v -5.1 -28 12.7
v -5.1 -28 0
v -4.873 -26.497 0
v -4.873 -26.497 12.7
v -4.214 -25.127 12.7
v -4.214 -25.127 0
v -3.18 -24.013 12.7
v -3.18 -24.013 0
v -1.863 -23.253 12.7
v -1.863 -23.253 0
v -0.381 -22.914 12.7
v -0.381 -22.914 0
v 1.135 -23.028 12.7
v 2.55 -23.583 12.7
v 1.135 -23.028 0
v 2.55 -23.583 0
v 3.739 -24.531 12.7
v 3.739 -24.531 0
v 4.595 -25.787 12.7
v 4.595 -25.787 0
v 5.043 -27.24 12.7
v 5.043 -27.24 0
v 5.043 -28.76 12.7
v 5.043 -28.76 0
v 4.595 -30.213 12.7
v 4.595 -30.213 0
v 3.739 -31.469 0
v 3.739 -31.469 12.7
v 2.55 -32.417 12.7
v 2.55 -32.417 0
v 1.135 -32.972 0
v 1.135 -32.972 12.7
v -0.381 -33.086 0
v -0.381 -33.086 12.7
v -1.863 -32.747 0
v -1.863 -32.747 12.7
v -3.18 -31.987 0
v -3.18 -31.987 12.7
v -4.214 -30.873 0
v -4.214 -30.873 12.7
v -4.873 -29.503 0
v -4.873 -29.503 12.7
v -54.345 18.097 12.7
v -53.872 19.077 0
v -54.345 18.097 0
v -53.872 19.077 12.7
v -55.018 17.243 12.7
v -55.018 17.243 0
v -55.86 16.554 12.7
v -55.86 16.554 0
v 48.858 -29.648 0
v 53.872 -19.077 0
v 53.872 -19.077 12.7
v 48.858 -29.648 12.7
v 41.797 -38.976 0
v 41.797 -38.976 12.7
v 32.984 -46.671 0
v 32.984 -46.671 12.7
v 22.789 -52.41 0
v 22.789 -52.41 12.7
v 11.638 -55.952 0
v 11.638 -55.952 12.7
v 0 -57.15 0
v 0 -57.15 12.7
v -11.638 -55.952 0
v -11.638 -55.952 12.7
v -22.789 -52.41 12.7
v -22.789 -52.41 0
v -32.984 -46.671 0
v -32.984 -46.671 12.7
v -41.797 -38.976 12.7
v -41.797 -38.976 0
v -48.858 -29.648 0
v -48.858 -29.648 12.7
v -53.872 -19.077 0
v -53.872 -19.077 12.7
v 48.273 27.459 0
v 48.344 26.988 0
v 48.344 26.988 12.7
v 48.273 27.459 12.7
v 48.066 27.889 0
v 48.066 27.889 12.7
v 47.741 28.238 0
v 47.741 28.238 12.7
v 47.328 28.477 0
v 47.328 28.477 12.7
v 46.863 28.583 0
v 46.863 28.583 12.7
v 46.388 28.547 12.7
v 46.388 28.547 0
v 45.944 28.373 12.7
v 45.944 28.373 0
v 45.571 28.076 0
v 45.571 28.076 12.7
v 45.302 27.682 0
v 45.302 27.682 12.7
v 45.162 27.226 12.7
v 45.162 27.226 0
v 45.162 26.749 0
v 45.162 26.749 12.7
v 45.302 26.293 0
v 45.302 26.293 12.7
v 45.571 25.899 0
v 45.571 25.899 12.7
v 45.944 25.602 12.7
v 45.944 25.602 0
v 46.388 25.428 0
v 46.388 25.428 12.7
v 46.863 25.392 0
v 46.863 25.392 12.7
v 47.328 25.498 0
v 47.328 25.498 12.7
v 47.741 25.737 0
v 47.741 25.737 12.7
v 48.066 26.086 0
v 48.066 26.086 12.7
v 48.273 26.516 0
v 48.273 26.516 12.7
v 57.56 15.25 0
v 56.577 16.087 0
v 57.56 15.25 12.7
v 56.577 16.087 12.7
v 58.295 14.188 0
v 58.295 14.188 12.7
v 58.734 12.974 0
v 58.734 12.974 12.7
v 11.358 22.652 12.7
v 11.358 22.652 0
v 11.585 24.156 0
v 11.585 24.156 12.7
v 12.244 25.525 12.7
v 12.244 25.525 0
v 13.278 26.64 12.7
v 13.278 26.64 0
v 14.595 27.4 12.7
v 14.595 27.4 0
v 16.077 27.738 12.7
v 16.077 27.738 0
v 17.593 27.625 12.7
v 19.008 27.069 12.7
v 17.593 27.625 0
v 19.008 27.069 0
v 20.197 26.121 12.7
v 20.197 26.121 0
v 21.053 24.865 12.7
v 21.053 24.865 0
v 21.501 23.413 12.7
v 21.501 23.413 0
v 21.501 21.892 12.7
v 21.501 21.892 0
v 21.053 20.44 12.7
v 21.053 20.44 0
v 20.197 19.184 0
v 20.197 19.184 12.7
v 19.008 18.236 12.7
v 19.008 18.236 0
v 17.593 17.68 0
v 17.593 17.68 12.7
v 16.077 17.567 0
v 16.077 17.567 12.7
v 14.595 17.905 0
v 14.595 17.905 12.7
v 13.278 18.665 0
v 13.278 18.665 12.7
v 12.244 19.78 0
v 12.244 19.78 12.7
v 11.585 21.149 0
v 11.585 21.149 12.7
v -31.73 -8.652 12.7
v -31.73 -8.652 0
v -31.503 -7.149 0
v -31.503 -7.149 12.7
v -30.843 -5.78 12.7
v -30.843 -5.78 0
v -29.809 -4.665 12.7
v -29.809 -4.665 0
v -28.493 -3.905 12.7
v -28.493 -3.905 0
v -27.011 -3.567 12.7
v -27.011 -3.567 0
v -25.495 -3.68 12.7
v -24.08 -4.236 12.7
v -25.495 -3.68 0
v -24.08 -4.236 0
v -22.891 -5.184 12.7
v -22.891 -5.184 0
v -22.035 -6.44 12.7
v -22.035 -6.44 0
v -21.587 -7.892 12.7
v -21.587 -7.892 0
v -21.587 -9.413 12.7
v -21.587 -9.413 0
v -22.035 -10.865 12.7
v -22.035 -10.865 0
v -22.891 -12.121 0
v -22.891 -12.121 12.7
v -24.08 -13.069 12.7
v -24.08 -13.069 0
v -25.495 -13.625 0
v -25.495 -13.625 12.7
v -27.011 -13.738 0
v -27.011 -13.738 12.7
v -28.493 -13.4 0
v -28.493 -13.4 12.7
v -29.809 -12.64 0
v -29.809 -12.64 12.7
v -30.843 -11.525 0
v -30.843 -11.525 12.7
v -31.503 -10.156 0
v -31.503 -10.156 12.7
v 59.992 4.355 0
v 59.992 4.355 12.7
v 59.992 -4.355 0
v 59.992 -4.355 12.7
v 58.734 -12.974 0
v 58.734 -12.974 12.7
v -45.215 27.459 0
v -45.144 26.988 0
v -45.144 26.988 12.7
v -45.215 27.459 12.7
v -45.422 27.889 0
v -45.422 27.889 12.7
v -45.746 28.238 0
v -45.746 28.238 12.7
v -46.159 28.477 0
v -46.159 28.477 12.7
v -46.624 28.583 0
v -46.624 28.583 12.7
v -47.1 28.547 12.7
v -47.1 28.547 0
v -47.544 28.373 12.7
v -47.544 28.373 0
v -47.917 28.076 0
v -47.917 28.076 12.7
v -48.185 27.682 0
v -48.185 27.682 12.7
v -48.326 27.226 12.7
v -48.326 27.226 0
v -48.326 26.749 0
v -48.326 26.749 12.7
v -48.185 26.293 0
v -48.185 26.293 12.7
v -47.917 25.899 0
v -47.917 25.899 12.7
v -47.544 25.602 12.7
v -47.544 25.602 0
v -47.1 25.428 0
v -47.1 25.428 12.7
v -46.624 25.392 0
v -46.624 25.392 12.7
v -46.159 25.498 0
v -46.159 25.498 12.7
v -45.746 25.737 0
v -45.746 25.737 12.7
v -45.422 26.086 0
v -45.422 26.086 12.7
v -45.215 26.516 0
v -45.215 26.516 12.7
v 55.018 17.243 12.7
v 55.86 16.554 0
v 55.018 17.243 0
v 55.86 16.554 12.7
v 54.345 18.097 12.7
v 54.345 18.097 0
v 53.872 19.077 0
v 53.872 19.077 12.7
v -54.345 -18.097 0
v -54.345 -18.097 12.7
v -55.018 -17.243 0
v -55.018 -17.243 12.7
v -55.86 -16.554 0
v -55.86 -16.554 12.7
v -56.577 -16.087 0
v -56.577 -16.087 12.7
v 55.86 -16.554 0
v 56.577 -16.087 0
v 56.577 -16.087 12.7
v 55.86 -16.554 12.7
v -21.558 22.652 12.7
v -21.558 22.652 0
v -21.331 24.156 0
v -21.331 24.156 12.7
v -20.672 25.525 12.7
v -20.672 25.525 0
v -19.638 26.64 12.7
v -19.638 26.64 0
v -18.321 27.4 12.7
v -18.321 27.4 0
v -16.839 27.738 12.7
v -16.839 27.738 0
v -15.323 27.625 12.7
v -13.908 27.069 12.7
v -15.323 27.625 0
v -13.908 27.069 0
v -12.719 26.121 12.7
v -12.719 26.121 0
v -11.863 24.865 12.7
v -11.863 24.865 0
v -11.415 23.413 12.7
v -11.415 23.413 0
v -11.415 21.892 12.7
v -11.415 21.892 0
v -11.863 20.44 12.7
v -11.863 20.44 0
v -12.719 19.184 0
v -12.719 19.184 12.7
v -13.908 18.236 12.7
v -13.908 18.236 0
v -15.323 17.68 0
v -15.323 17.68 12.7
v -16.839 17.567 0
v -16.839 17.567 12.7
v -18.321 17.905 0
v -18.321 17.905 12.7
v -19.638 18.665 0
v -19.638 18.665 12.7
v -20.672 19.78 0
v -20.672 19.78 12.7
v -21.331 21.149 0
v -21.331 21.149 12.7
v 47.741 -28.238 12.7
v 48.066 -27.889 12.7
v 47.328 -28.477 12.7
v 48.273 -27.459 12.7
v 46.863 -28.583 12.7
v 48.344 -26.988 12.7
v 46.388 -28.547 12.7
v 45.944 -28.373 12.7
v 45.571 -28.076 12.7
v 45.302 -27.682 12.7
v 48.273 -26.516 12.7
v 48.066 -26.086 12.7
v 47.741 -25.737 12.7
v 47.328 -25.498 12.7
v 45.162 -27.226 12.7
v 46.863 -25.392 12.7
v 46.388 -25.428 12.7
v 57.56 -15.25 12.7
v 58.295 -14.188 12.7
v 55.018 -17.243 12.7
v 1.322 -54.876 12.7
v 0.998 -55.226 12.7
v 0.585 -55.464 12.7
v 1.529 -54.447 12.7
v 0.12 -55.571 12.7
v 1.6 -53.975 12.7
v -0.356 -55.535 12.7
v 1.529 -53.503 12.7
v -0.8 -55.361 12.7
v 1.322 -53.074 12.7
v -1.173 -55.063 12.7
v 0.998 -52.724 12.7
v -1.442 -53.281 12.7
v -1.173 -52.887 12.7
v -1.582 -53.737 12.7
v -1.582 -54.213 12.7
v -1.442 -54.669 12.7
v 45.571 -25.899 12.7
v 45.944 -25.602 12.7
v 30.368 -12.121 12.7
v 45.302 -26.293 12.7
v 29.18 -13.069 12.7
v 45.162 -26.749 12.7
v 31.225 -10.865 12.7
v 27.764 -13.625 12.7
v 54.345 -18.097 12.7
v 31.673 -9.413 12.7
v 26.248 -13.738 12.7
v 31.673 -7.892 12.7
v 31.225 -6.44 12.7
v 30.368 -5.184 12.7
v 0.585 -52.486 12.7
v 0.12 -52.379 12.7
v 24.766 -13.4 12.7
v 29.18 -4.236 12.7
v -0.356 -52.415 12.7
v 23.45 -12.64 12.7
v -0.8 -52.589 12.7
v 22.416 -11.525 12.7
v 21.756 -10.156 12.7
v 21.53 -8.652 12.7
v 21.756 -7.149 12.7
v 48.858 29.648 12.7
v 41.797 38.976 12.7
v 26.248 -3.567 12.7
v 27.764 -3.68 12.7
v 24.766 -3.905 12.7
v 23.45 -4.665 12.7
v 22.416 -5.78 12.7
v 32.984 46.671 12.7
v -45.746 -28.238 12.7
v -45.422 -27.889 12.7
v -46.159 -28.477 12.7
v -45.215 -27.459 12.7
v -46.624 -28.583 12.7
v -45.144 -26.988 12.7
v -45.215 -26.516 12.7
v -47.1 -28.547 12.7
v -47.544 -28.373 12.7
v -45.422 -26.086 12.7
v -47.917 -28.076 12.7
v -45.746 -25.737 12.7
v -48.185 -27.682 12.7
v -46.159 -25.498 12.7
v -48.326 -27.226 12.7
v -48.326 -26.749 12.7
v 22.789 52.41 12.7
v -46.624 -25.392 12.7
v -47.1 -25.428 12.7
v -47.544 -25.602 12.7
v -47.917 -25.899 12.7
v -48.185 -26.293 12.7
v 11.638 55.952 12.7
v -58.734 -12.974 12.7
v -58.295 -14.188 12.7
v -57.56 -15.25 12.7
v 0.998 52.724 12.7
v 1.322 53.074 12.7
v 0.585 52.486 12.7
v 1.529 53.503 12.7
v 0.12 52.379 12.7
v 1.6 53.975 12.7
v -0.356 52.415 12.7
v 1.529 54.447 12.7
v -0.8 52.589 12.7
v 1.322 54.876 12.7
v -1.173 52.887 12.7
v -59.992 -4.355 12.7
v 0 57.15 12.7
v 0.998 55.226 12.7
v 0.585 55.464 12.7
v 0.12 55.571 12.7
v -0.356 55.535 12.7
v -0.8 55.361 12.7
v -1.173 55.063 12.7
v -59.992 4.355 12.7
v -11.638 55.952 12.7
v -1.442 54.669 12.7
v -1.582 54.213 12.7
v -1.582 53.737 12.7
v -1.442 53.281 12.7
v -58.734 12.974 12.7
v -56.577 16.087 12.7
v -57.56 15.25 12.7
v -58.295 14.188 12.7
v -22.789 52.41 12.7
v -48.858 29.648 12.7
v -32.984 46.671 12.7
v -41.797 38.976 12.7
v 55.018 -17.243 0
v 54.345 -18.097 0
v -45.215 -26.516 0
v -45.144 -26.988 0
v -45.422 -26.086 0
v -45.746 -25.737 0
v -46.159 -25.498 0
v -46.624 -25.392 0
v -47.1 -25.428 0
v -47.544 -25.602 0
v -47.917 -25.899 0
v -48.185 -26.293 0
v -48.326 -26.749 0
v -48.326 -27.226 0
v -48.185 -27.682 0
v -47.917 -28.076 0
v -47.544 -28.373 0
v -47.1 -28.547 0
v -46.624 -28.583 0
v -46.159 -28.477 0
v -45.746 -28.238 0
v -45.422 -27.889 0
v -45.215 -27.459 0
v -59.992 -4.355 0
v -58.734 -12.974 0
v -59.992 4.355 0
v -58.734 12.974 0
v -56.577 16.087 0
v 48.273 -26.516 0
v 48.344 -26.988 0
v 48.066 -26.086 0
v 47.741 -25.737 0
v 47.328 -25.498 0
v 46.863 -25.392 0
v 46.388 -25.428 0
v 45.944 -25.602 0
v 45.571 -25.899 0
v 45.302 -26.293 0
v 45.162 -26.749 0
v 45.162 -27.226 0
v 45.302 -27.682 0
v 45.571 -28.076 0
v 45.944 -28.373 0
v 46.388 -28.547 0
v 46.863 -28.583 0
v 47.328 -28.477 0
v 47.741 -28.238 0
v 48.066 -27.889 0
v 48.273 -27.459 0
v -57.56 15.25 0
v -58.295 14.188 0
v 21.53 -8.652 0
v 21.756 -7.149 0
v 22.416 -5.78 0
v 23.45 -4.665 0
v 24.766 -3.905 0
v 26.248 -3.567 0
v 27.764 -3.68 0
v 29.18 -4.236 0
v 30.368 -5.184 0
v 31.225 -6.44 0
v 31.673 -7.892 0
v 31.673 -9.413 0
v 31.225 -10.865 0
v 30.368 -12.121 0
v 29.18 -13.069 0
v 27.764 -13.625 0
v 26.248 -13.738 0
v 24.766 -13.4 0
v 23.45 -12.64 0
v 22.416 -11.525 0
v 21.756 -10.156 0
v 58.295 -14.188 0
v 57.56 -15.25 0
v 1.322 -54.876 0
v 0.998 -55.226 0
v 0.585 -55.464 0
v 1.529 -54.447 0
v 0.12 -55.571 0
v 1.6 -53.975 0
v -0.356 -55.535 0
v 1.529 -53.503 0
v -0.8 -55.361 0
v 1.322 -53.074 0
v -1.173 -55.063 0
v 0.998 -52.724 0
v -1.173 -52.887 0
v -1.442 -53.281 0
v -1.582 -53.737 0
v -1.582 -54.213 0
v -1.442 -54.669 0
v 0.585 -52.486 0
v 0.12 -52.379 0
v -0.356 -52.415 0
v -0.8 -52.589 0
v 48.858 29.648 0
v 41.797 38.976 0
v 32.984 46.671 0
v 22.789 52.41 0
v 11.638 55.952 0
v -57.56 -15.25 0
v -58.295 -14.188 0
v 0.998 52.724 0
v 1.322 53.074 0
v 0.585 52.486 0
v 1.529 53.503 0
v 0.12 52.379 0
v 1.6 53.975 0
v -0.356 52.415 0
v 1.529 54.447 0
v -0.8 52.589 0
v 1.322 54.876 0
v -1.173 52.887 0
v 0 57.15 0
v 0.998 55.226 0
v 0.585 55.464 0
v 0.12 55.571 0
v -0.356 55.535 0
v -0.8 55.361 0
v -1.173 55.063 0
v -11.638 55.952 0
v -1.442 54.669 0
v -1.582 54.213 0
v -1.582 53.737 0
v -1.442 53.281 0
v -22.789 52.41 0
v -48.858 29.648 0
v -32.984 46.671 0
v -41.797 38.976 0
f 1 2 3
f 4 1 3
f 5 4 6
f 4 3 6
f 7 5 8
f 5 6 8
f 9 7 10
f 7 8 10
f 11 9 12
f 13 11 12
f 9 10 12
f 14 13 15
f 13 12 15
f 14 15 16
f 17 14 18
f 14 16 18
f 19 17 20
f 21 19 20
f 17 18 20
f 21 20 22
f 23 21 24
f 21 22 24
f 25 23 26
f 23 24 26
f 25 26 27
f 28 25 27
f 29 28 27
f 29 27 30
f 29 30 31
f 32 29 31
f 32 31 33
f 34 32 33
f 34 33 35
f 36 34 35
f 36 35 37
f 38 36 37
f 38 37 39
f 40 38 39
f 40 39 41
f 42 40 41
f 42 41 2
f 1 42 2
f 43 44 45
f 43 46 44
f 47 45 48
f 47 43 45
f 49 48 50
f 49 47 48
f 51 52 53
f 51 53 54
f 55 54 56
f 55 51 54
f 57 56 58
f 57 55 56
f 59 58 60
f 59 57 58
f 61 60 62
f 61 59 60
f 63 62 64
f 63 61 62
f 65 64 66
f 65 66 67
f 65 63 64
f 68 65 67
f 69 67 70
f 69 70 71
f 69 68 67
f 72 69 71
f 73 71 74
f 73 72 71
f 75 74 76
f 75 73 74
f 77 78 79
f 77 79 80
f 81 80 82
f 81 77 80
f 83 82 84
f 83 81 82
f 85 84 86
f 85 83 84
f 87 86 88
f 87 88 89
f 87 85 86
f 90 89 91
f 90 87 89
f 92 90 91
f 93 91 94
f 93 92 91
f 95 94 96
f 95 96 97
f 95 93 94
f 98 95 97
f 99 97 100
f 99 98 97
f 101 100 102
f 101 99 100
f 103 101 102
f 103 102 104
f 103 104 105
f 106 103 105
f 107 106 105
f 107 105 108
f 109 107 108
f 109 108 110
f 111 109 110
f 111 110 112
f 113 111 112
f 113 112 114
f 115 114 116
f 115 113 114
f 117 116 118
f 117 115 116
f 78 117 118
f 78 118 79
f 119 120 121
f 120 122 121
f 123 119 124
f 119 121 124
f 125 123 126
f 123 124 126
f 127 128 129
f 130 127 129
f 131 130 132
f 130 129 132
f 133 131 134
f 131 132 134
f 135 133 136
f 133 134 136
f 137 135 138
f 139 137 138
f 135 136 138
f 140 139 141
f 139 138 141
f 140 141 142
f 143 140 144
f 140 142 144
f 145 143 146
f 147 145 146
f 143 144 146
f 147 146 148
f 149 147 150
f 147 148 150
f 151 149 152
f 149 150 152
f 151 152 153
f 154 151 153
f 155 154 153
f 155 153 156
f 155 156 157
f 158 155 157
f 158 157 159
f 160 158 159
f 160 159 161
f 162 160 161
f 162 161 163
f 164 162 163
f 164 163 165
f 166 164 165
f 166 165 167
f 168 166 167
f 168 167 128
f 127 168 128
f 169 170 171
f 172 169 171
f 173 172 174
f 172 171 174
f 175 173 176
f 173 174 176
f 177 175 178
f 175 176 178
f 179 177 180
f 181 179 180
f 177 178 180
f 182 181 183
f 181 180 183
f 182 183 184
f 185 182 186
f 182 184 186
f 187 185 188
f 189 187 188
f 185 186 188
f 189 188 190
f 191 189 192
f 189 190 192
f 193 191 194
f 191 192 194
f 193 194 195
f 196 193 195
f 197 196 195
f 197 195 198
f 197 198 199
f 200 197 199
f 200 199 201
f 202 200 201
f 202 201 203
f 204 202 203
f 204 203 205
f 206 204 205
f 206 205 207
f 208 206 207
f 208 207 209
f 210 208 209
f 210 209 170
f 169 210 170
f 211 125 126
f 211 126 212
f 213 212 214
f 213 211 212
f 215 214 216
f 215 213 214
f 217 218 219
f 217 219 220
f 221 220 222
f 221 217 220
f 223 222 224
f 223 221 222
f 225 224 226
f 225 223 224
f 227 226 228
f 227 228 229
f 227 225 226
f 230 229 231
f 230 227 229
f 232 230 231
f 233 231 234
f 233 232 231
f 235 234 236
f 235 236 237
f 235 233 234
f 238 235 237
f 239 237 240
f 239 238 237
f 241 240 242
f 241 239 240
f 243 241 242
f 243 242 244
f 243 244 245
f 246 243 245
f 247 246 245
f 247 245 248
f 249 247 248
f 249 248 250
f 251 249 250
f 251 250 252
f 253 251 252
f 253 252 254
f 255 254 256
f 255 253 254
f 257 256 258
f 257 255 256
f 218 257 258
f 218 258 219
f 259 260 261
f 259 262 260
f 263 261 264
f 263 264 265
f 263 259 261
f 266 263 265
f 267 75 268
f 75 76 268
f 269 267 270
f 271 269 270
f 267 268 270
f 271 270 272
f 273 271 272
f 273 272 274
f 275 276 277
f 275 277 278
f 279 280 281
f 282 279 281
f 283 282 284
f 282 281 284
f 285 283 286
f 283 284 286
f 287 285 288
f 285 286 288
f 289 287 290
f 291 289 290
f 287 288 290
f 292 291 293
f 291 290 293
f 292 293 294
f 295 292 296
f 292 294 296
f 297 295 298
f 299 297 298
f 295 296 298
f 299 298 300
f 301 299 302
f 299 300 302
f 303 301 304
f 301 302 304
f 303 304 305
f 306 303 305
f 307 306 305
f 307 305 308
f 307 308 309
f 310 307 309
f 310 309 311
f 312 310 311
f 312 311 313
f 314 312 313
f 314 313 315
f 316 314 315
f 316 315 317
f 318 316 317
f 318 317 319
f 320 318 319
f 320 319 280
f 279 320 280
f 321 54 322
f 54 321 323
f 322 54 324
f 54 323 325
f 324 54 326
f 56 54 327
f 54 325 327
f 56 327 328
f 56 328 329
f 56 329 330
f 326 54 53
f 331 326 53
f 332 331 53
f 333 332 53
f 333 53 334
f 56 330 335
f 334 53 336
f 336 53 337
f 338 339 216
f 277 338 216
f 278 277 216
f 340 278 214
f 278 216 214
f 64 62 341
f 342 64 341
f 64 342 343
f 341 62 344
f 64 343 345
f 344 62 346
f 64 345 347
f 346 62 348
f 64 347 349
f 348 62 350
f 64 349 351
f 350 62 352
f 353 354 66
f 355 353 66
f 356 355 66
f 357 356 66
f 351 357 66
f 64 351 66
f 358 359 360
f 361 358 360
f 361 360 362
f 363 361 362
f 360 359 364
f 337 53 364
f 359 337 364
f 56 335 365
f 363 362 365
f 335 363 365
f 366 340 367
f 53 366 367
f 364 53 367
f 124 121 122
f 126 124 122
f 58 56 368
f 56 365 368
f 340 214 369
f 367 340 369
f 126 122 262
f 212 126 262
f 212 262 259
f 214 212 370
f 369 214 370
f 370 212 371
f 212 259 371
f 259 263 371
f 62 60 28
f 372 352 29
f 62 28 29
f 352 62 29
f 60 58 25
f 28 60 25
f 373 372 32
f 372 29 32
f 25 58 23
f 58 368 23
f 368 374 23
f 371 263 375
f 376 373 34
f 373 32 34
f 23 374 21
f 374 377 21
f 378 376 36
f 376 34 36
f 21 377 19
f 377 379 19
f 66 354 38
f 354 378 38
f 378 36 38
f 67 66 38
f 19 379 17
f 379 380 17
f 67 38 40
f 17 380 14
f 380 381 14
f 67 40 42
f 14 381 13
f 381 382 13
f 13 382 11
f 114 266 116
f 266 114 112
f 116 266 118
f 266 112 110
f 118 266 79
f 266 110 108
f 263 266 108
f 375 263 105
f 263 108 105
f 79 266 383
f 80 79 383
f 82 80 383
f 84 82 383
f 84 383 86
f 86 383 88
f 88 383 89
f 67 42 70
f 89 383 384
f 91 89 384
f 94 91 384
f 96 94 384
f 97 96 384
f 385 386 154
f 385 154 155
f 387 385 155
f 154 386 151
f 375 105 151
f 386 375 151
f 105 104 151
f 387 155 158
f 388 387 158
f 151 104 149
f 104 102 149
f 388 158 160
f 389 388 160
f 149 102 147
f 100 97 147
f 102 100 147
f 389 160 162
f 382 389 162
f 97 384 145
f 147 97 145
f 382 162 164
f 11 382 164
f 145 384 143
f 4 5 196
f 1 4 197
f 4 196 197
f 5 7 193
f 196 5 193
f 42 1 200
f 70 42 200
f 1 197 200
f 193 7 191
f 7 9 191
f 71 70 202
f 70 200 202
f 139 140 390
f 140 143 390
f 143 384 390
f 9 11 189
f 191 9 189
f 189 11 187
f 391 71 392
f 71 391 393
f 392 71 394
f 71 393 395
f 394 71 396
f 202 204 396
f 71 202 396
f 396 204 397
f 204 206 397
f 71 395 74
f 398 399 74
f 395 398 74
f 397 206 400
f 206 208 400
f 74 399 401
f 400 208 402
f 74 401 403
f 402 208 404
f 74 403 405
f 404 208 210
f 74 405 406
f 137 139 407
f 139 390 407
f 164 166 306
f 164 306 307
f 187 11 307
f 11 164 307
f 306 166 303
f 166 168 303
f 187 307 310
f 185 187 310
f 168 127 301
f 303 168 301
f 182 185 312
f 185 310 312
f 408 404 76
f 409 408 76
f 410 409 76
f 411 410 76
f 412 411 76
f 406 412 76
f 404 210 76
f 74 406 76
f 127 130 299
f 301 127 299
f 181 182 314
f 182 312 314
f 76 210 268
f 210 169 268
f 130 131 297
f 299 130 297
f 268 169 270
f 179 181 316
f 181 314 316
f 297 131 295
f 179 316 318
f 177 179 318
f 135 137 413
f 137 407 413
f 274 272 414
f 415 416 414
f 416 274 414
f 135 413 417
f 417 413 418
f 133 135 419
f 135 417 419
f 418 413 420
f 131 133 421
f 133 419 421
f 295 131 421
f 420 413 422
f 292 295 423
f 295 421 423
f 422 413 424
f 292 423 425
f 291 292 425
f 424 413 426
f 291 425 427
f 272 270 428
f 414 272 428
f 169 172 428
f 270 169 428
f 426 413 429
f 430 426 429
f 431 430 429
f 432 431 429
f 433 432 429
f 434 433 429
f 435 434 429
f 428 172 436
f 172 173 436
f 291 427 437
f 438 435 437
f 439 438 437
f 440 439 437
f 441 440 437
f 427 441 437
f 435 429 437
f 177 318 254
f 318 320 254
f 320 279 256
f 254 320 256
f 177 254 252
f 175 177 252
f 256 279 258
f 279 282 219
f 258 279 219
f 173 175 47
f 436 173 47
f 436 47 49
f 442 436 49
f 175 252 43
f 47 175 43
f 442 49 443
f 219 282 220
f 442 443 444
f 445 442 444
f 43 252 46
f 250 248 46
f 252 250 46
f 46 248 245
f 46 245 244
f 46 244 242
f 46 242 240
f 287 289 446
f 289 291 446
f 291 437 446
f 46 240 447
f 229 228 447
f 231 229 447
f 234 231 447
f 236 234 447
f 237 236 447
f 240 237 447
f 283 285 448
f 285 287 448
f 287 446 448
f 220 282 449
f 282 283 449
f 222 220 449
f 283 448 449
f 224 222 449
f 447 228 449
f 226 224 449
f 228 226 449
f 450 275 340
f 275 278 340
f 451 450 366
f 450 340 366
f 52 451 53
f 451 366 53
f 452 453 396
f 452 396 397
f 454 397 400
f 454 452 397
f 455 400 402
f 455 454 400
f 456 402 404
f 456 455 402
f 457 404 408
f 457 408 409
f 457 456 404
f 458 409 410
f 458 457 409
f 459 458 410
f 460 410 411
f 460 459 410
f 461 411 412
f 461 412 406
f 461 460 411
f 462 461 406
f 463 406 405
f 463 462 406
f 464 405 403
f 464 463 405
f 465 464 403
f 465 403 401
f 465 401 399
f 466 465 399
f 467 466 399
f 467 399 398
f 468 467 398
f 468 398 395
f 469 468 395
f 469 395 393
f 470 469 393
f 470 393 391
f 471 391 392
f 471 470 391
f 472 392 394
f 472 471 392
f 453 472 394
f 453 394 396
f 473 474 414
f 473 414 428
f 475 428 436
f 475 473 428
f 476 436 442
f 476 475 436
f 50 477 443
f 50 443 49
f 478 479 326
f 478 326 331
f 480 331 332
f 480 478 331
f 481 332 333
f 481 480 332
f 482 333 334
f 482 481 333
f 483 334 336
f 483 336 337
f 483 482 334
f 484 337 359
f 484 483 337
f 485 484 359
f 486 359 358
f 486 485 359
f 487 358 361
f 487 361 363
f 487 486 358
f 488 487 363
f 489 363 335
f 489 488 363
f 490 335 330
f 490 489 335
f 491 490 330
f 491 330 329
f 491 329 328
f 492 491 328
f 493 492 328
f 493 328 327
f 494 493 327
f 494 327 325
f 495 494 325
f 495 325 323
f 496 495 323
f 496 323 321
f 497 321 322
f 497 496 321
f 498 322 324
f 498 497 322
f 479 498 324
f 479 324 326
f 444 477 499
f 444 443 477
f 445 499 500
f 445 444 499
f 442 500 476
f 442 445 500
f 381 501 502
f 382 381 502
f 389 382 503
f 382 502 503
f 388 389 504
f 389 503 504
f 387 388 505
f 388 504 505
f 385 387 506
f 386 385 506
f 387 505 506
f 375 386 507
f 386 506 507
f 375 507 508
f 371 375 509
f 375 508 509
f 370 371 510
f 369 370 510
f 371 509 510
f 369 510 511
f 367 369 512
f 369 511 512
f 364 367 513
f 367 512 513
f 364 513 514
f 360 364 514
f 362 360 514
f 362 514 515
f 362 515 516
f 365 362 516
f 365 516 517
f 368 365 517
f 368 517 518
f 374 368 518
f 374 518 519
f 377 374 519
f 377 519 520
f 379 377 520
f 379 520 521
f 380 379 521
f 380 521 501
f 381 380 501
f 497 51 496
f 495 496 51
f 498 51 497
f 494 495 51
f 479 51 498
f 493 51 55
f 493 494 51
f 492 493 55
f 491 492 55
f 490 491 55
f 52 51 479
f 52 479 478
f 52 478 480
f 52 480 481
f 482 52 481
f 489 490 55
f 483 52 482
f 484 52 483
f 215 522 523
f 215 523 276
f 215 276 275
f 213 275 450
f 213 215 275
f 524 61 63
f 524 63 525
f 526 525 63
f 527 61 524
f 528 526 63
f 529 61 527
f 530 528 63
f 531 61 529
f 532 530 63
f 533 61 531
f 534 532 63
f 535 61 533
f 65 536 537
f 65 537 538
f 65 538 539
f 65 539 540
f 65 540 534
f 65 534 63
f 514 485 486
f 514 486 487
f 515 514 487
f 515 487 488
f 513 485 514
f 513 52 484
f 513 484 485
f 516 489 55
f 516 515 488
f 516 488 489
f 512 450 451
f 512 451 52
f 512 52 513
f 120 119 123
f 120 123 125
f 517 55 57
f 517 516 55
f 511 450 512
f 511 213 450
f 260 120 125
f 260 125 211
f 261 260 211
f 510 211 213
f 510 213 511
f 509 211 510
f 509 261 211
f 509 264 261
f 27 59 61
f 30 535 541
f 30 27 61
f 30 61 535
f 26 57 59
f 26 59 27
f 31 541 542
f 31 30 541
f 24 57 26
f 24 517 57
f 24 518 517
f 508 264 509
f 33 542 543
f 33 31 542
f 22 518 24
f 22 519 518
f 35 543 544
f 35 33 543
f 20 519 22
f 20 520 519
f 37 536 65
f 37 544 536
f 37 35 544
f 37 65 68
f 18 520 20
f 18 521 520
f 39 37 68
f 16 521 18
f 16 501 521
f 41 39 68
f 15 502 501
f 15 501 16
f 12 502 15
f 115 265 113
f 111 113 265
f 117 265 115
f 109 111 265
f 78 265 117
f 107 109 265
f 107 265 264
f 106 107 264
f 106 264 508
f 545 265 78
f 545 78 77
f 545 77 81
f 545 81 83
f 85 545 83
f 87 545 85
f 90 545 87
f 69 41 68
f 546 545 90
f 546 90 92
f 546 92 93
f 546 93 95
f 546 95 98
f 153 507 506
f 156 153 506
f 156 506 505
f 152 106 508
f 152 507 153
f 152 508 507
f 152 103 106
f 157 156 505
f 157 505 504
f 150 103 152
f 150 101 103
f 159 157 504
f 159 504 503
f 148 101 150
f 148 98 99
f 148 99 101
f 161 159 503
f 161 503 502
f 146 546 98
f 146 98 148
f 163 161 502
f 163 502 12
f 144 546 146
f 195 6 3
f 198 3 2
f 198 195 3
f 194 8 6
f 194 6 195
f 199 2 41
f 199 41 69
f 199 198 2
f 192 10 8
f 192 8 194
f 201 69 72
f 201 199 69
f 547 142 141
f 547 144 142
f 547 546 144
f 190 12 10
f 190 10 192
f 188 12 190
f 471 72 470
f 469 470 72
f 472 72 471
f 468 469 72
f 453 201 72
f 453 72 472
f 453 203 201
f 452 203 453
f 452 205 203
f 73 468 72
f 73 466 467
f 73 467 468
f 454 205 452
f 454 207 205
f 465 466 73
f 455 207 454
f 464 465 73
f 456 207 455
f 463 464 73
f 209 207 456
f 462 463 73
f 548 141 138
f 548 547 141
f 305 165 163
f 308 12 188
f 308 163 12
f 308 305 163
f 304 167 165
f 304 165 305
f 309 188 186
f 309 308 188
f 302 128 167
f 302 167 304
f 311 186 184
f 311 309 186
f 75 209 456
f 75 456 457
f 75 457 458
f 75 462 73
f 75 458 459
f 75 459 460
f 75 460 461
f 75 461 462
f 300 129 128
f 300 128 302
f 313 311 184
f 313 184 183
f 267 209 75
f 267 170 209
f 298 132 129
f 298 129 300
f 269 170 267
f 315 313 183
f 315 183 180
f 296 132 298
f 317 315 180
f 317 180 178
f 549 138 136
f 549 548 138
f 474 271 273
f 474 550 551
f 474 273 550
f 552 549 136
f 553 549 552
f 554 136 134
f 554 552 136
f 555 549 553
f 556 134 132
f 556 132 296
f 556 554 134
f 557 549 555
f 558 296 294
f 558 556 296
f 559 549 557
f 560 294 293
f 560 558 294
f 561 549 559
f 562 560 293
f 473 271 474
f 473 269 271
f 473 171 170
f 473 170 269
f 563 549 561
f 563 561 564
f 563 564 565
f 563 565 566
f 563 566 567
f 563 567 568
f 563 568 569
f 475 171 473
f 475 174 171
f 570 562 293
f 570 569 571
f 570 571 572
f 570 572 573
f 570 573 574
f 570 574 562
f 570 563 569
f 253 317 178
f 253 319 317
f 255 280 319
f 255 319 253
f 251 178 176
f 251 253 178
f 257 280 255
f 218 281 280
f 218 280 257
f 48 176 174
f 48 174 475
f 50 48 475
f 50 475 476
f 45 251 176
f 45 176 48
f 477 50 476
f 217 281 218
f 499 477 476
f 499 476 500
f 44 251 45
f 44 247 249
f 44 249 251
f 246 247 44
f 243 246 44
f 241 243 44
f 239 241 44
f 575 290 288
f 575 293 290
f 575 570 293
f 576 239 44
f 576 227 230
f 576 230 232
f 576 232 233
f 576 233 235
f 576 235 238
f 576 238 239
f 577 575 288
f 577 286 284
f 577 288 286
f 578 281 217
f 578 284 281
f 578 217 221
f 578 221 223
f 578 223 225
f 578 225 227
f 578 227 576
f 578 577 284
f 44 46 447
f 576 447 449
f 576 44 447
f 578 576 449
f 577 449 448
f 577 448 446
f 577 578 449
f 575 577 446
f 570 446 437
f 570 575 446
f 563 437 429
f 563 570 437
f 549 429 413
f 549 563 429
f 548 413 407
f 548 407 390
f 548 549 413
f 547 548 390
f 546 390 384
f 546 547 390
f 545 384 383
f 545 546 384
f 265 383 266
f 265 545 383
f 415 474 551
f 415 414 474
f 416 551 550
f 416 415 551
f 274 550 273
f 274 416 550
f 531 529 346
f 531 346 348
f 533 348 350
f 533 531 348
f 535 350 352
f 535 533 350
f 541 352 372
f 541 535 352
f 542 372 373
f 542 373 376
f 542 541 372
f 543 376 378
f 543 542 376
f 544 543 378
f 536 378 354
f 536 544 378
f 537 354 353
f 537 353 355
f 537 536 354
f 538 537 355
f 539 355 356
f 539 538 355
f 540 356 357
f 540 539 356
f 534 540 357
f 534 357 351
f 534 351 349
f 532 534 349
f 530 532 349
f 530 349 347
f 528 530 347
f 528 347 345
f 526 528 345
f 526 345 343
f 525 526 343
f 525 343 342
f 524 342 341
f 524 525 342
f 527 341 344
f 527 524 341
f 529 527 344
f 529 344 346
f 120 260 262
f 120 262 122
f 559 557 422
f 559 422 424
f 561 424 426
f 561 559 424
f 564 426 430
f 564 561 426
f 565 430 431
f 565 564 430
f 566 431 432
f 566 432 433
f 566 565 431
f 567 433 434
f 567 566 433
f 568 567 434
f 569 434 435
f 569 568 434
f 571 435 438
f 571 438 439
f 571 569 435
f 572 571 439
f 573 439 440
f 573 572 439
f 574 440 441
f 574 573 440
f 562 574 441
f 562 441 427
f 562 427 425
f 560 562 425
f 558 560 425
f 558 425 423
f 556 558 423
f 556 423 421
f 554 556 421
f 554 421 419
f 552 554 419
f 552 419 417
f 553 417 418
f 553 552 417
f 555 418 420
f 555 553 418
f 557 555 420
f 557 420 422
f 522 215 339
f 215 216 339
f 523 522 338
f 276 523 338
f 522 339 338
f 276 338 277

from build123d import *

# Parameters (mm, degrees)
SKETCH1_R           = 1.6
BOSS_EXTRUDE1_DEPTH = 12.7
SKETCH6_R           = 5.1
CUT_EXTRUDE2_DEPTH  = 13.7
FILLET1_R           = 5


with BuildPart() as part:
    # Sketch1 → Boss-Extrude1 (new body)
    with BuildSketch(Plane.XY):
        with BuildLine():
            Line((54.404710274, 17.5), (58.249656651, 15))
            ThreePointArc((58.249656651, 15), (60.15, 0), (58.249656651, -15))
            Line((58.249656651, -15), (54.404710274, -17.5))
            ThreePointArc((54.404710274, -17.5), (0, -57.15), (-54.404710274, -17.5))
            Line((-54.404710274, -17.5), (-58.249656651, -15))
            ThreePointArc((-58.249656651, -15), (-60.15, 0), (-58.249656651, 15))
            Line((-58.249656651, 15), (-54.404710274, 17.5))
            ThreePointArc((-54.404710274, 17.5), (0, 57.15), (54.404710274, 17.5))
        make_face()
        with Locations((0, 53.975)):
            Circle(SKETCH1_R, mode=Mode.SUBTRACT)
        with Locations((46.743721169, 26.9875)):
            Circle(SKETCH1_R, mode=Mode.SUBTRACT)
        with Locations((46.743721169, -26.9875)):
            Circle(SKETCH1_R, mode=Mode.SUBTRACT)
        with Locations((0, -53.975)):
            Circle(SKETCH1_R, mode=Mode.SUBTRACT)
        with Locations((-46.743721169, -26.9875)):
            Circle(SKETCH1_R, mode=Mode.SUBTRACT)
        with Locations((-46.743721169, 26.9875)):
            Circle(SKETCH1_R, mode=Mode.SUBTRACT)
    extrude(amount=BOSS_EXTRUDE1_DEPTH)

    # Sketch6 → Cut-Extrude2 (cut, through all)
    with BuildSketch(Plane(origin=(0, 0, 0), x_dir=(-1, 0, 0), z_dir=(0, 0, -1))):
        with Locations((16.457987064, 22.652475842)):
            Circle(SKETCH6_R)
        with Locations((-26.629582456, -8.652475842)):
            Circle(SKETCH6_R)
        with Locations((26.629582456, -8.652475842)):
            Circle(SKETCH6_R)
        with Locations((-16.457987064, 22.652475842)):
            Circle(SKETCH6_R)
        with Locations((0, -28)):
            Circle(SKETCH6_R)
    extrude(amount=-CUT_EXTRUDE2_DEPTH, mode=Mode.SUBTRACT)

    # Fillet1
    fillet1_edges = [part.edges().sort_by_distance(p)[0] for p in [
        (54.404710274, 17.5, 6.35),
        (58.249656651, 15, 6.35),
        (58.249656651, -15, 6.35),
        (54.404710274, -17.5, 6.35),
        (-54.404710274, -17.5, 6.35),
        (-58.249656651, -15, 6.35),
        (-58.249656651, 15, 6.35),
        (-54.404710274, 17.5, 6.35),
    ]]
    fillet(fillet1_edges, radius=FILLET1_R)


solid = part.part
